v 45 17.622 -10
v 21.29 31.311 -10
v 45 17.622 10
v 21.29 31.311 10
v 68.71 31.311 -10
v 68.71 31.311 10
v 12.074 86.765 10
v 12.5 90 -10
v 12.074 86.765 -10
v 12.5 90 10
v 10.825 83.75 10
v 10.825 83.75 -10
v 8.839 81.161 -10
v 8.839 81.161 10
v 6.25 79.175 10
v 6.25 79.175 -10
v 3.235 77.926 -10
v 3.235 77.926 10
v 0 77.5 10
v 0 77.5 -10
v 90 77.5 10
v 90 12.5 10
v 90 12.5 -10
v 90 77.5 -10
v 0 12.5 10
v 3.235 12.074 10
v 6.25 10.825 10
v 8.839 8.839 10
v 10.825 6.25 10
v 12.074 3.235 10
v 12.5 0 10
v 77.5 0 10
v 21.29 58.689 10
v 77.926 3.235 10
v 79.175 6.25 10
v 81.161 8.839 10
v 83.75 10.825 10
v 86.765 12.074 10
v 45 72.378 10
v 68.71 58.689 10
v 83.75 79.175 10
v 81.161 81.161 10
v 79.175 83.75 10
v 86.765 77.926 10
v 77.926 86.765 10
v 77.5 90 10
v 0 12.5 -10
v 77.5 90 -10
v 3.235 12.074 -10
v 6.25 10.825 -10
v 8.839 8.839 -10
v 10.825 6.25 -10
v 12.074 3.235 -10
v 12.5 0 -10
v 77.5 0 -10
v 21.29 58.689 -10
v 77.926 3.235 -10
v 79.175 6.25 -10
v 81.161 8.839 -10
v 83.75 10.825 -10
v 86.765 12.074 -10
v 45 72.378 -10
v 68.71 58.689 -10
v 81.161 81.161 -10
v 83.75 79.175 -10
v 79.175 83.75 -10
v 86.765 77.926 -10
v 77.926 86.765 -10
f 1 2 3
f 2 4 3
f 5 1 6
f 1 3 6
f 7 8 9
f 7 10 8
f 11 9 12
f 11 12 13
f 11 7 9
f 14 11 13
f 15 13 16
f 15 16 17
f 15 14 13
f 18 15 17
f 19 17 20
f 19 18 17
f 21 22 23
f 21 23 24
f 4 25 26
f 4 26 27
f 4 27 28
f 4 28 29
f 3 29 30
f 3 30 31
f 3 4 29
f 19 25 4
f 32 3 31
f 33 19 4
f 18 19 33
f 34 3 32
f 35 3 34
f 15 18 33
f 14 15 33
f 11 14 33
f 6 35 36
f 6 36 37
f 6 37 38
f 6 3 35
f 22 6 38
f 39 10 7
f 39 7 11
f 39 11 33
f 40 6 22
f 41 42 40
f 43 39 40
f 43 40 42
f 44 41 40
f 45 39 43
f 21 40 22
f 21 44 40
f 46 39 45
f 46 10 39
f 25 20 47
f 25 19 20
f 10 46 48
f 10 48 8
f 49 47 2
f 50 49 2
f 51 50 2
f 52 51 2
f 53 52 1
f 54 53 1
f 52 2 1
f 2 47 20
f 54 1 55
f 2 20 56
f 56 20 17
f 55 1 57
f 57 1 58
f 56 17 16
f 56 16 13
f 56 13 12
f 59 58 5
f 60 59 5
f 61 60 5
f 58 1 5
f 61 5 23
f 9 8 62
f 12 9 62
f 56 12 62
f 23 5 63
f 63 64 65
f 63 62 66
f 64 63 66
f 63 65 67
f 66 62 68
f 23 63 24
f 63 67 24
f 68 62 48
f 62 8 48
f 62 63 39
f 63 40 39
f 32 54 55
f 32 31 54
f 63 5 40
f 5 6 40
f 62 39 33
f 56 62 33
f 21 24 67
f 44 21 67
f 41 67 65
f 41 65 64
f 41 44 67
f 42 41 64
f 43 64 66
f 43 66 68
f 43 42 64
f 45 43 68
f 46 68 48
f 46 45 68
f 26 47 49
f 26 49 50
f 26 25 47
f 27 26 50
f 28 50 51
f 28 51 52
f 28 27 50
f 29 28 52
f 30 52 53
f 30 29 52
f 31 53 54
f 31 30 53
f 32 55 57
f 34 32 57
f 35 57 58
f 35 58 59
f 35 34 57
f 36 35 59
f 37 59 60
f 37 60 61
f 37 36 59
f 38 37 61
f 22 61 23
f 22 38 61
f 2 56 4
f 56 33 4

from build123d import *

# Parameters (mm, degrees)
BOSS_EXTRUDE3_DEPTH = 10


with BuildPart() as part:
    # Sketch1 → Boss-Extrude3 (new, symmetric)
    with BuildSketch(Plane.XY):
        with BuildLine():
            Line((12.5, 0), (77.5, 0))
            ThreePointArc((77.5, 0), (81.161165235, 8.838834765), (90, 12.5))
            Line((90, 12.5), (90, 77.5))
            ThreePointArc((90, 77.5), (81.161165235, 81.161165235), (77.5, 90))
            Line((77.5, 90), (12.5, 90))
            ThreePointArc((12.5, 90), (8.838834765, 81.161165235), (0, 77.5))
            Line((0, 77.5), (0, 12.5))
            ThreePointArc((0, 12.5), (8.838834765, 8.838834765), (12.5, 0))
        make_face()
        Polygon((45, 72.378151261), (21.2898255, 58.68907563), (21.2898255, 31.31092437), (45, 17.621848739), (68.7101745, 31.31092437), (68.7101745, 58.68907563), align=None, mode=Mode.SUBTRACT)
    extrude(amount=BOSS_EXTRUDE3_DEPTH, both=True)


solid = part.part
